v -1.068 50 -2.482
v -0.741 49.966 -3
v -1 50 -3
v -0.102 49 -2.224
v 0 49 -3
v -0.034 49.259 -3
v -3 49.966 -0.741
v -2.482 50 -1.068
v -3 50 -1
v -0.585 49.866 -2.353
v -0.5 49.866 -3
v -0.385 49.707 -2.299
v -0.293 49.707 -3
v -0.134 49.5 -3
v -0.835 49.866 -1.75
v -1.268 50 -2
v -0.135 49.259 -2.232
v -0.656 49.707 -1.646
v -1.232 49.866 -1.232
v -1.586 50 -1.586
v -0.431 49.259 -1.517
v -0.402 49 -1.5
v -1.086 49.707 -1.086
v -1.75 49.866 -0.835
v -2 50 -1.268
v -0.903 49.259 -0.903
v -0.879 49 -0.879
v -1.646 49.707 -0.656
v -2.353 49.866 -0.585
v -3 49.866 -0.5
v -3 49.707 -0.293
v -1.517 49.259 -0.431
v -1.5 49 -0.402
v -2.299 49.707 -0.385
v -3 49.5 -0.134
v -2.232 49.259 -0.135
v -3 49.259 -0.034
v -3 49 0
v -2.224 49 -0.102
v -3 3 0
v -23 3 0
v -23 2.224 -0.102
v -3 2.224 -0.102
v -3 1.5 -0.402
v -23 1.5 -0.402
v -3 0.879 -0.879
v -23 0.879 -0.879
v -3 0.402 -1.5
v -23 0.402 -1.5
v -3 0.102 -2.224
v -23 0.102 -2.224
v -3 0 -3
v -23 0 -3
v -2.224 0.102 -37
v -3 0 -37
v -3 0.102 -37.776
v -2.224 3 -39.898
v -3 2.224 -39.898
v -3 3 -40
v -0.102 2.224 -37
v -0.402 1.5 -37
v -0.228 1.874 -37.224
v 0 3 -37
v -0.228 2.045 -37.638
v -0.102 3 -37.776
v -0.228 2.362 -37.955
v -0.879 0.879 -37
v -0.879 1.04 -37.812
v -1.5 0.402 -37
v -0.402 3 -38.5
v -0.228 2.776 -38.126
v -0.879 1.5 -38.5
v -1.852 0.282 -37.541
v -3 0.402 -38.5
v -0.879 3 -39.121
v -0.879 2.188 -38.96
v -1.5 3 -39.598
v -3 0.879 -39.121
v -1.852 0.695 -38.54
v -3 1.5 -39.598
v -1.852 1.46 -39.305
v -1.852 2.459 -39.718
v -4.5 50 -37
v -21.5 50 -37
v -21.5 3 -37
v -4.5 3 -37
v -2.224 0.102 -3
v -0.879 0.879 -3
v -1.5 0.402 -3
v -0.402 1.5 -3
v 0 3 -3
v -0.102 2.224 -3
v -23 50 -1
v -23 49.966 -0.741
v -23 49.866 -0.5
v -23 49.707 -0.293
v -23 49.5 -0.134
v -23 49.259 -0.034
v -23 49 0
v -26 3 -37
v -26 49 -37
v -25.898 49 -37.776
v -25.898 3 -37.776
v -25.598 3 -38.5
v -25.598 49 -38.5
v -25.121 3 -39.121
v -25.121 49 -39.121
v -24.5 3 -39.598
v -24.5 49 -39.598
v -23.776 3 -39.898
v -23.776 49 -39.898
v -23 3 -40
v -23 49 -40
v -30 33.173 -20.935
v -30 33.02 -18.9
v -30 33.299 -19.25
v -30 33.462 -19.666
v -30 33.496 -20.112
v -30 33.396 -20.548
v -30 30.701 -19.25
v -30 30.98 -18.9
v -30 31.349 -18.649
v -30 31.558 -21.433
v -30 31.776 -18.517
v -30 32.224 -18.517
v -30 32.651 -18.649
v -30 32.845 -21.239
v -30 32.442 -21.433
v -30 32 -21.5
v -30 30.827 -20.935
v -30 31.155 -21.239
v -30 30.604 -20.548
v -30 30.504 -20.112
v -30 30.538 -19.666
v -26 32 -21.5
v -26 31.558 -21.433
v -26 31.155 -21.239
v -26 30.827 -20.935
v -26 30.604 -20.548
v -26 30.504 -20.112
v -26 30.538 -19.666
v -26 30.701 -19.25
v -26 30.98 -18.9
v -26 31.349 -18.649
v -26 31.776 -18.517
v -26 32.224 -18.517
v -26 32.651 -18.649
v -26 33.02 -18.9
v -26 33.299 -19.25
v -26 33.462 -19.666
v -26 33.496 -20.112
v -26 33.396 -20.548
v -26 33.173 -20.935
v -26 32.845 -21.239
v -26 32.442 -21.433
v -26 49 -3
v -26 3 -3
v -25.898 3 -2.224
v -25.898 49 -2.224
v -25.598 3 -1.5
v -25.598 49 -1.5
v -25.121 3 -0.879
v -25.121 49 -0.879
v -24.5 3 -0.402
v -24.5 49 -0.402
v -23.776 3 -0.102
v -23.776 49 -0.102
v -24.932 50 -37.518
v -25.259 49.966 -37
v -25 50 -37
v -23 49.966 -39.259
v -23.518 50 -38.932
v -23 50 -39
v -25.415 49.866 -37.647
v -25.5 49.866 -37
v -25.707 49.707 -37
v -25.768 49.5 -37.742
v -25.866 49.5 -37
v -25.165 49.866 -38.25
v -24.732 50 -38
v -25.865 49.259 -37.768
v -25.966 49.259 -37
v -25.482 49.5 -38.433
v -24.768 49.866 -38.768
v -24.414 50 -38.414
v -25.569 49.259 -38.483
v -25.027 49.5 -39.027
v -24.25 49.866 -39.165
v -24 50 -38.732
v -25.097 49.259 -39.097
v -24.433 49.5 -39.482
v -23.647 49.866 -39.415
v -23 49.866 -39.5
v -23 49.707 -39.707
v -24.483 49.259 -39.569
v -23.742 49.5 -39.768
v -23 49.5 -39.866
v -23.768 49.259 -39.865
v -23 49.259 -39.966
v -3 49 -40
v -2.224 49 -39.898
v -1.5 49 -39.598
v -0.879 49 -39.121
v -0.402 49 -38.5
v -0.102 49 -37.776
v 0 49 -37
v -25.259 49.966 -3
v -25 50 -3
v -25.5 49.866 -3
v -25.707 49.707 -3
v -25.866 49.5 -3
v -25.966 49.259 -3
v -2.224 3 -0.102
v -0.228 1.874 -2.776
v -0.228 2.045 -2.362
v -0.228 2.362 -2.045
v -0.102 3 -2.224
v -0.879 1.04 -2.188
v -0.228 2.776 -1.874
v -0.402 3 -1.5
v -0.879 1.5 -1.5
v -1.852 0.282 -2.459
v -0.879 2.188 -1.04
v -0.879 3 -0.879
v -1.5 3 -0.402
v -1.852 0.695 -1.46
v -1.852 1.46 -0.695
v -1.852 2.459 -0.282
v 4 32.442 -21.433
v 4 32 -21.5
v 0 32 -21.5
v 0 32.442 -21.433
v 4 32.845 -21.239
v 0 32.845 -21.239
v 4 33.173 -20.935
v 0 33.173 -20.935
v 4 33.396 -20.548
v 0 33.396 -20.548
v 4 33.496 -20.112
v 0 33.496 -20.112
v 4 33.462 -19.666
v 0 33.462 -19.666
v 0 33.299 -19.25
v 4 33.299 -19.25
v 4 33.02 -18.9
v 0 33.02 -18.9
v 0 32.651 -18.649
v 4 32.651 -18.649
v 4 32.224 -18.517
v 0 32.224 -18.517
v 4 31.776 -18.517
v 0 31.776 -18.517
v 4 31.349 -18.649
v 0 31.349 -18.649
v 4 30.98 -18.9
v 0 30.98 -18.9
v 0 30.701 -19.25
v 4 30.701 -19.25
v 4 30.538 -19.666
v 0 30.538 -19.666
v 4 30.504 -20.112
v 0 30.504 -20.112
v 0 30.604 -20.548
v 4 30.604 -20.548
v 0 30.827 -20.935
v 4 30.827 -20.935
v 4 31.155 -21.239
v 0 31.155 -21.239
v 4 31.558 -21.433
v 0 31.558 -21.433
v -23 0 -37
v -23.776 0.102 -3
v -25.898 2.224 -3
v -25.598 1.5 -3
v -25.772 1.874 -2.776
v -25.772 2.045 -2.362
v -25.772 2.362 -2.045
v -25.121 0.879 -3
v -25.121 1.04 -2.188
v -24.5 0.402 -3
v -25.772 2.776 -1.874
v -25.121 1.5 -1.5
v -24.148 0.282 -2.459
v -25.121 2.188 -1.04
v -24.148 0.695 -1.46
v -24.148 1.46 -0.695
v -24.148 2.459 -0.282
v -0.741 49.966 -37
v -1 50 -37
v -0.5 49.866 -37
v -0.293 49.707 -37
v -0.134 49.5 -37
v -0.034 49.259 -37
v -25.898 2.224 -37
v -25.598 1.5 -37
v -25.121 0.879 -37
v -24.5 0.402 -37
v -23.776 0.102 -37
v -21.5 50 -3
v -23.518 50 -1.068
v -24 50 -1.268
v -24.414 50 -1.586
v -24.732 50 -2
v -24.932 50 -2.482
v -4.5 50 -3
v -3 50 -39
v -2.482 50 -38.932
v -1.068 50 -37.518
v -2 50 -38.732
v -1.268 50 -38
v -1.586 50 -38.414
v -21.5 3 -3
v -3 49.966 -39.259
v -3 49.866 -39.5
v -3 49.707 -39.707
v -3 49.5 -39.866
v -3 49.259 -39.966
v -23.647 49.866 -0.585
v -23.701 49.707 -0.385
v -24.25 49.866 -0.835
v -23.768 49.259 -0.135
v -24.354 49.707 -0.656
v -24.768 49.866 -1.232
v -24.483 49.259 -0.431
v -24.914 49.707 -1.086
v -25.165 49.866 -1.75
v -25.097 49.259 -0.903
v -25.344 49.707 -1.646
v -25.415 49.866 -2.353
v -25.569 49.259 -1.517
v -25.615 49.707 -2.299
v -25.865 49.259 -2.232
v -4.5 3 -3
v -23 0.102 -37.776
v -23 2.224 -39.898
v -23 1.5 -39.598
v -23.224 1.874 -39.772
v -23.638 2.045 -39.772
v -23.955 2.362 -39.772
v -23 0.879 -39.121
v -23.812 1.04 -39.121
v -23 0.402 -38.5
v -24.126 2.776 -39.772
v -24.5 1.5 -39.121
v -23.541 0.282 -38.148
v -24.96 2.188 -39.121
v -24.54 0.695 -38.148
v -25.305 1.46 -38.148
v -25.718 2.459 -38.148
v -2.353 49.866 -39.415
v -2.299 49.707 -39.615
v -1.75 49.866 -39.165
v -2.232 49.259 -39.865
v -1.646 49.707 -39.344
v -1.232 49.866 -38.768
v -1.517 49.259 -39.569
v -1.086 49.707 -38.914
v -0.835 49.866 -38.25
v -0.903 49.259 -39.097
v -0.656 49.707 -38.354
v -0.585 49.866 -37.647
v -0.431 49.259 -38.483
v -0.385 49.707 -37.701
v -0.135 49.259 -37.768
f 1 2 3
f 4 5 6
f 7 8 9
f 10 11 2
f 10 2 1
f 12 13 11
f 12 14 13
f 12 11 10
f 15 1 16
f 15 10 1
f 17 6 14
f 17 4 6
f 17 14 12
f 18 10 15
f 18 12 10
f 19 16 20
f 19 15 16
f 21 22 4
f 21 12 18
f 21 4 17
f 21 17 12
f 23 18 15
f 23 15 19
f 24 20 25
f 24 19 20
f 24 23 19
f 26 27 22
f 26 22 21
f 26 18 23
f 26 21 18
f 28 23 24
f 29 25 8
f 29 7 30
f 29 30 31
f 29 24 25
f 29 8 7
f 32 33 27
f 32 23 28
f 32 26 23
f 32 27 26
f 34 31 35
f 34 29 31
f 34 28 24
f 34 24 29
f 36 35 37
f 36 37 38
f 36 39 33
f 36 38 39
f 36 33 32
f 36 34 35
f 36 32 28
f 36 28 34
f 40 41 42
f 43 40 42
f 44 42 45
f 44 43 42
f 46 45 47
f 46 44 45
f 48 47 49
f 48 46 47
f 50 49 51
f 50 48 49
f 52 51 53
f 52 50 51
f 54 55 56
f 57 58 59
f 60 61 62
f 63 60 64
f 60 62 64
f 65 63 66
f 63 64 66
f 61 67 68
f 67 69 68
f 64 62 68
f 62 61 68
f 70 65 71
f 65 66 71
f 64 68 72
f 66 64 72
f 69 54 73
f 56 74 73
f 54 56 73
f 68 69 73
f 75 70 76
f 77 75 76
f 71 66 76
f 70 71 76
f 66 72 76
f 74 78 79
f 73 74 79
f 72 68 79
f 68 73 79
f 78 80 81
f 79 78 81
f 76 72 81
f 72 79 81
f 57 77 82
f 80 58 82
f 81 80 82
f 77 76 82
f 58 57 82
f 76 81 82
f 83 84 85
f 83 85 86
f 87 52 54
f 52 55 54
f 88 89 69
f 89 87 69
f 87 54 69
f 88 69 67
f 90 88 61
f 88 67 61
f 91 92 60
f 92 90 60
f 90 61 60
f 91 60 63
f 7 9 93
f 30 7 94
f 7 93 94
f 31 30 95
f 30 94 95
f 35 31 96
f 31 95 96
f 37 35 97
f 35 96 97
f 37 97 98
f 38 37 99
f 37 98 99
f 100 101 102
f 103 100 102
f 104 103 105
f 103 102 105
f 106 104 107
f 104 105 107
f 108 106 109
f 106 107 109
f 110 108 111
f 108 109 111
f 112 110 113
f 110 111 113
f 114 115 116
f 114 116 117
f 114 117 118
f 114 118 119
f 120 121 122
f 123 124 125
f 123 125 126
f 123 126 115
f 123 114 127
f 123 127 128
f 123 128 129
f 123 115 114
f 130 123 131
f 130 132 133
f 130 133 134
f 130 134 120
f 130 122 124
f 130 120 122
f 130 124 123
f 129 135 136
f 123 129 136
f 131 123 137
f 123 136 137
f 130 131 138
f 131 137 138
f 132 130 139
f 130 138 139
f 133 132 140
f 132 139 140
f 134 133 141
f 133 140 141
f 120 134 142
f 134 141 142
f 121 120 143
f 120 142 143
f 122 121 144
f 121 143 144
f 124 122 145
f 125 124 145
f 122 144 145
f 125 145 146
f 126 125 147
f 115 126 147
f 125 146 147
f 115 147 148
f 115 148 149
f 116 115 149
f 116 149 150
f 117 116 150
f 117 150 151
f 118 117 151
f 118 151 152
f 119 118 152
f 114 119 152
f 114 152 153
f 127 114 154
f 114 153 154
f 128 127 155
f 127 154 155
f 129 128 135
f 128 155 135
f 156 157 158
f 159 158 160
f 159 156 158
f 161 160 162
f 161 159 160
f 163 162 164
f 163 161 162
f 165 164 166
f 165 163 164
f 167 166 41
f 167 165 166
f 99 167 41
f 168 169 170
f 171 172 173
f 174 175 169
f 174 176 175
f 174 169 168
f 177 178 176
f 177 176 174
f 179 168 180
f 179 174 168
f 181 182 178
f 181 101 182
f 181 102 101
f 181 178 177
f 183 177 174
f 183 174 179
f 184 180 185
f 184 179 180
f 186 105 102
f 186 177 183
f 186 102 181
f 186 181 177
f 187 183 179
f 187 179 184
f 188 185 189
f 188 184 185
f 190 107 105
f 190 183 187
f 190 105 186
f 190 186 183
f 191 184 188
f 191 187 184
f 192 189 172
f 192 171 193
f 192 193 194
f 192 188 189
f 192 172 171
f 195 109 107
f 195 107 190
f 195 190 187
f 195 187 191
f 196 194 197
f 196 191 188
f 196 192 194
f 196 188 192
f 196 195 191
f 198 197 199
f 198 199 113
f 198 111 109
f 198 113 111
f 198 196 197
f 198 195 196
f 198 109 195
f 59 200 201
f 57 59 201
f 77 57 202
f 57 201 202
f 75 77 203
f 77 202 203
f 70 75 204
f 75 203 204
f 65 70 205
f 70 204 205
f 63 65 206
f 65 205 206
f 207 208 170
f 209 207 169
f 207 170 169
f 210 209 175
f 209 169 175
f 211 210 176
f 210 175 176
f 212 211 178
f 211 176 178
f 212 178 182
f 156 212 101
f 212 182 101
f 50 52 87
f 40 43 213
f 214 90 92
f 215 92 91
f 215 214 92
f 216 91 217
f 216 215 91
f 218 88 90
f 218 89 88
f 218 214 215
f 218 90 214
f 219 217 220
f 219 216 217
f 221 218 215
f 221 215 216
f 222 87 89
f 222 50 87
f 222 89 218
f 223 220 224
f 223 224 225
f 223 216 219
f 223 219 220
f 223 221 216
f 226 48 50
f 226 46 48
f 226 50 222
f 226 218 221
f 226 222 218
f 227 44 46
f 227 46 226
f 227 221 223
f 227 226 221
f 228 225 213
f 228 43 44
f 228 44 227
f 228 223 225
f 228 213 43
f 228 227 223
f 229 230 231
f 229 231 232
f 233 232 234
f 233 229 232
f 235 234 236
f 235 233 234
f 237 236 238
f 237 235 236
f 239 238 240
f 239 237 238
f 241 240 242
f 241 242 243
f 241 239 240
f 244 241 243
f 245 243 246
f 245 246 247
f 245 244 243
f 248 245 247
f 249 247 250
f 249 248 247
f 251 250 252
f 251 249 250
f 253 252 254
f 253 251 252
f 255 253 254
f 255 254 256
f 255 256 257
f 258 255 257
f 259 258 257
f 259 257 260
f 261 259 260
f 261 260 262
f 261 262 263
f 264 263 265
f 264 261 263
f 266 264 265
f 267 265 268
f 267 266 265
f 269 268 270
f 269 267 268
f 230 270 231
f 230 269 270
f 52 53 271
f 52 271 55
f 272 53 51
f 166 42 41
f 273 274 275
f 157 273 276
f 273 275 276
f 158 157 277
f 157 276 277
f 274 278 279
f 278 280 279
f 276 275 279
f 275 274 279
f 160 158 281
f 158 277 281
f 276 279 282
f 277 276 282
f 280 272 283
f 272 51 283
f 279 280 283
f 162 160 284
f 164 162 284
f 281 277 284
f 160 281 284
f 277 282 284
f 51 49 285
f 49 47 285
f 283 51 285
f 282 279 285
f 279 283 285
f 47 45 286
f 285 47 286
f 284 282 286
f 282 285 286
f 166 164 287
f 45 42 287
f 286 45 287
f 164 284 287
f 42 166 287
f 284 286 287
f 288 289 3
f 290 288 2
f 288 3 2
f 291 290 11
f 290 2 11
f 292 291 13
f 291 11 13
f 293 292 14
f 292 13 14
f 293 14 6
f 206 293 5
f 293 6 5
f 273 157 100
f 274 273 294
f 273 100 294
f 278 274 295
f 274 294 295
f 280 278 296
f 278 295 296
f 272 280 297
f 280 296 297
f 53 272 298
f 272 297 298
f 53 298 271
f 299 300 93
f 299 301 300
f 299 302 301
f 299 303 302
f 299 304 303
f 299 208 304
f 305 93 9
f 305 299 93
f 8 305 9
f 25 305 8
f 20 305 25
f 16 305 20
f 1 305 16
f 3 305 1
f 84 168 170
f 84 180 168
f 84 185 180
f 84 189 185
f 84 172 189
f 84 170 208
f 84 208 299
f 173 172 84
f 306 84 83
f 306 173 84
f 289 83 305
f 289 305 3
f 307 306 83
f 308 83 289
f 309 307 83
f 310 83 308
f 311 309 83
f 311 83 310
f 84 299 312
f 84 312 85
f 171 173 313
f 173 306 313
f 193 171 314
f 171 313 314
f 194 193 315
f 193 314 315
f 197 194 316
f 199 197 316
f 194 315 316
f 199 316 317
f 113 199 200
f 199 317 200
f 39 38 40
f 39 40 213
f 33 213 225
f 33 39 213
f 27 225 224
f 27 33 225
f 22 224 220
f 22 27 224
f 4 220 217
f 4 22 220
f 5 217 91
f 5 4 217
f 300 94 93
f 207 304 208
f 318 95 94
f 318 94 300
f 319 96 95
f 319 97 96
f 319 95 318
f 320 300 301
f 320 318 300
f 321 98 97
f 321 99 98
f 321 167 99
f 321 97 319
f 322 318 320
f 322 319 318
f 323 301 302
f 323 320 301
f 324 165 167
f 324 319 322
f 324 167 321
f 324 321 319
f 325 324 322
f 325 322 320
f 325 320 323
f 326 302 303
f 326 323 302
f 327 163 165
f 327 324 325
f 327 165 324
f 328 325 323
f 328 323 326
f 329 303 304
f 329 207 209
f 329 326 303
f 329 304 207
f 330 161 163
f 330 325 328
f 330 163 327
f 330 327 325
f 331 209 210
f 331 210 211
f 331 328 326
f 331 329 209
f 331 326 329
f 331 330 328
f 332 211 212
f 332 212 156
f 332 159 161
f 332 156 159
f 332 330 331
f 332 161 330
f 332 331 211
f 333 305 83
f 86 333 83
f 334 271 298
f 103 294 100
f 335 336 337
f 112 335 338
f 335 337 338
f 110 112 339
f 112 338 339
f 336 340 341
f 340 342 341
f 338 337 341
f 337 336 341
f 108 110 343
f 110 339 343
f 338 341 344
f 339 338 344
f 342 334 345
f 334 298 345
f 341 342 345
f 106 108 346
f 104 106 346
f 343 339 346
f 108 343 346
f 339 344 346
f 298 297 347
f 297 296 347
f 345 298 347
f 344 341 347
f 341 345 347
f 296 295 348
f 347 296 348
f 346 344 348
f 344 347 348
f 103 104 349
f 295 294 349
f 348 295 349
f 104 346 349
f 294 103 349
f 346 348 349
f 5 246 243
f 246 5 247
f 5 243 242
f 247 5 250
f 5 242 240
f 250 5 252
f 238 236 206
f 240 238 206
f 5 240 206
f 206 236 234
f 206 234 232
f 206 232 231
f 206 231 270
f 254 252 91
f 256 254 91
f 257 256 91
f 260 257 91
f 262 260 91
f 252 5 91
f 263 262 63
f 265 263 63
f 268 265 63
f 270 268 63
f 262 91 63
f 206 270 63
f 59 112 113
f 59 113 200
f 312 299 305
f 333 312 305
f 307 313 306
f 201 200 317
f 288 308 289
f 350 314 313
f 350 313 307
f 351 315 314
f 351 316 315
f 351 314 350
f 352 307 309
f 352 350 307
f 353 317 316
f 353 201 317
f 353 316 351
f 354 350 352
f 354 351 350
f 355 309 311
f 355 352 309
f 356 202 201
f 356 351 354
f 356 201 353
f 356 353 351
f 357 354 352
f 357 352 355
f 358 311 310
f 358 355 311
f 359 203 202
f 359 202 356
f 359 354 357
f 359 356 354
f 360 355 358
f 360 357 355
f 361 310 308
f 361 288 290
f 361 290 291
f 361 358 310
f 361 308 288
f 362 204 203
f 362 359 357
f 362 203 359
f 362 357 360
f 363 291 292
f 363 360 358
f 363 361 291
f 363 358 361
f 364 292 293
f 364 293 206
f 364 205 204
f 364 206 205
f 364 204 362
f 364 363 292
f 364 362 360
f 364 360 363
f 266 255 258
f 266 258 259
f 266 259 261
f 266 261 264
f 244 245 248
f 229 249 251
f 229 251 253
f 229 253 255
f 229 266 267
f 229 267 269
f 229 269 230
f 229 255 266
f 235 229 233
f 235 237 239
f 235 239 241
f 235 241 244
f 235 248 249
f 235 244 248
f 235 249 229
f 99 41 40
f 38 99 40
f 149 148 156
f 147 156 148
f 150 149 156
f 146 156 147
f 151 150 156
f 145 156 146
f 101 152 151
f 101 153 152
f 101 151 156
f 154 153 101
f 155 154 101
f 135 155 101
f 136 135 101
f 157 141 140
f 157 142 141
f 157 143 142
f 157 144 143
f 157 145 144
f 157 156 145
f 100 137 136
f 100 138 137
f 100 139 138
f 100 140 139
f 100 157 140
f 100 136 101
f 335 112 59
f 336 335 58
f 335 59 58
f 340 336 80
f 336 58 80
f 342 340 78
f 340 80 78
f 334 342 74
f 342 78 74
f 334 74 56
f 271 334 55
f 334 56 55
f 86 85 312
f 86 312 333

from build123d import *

# Parameters (mm, degrees)
CROQUIS1_W              = 26
CROQUIS1_H              = 40
SALIENTE_EXTRUIR1_DEPTH = 50
CROQUIS2_W              = 17
CROQUIS2_H              = 34
CORTAR_EXTRUIR1_DEPTH   = 47
REDONDEO1_R             = 3
REDONDEO2_R             = 1
CROQUIS4_R              = 1.5
SALIENTE_EXTRUIR2_DEPTH = 4
SALIENTE_EXTRUIR3_START = 4
CROQUIS5_R              = 1.5
SALIENTE_EXTRUIR3_DEPTH = 4


with BuildPart() as part:
    # Croquis1 → Saliente-Extruir1 (new body)
    with BuildSketch(Plane(origin=(0, 0, 0), x_dir=(1, 0, 0), z_dir=(0, 1, 0))):
        with Locations((-13, 20)):
            Rectangle(CROQUIS1_W, CROQUIS1_H)
    extrude(amount=SALIENTE_EXTRUIR1_DEPTH)

    # Croquis2 → Cortar-Extruir1 (cut)
    with BuildSketch(Plane(origin=(0, 50, 0), x_dir=(1, 0, 0), z_dir=(0, 1, 0))):
        with Locations((-13, 20)):
            Rectangle(CROQUIS2_W, CROQUIS2_H)
    extrude(amount=-CORTAR_EXTRUIR1_DEPTH, mode=Mode.SUBTRACT)

    # Redondeo1
    redondeo1_edges = [part.edges().sort_by_distance(p)[0] for p in [
        (-13, 0, 0),
        (-26, 0, -20),
        (-13, 0, -40),
        (0, 0, -20),
        (0, 25, 0),
        (-26, 25, 0),
        (-26, 25, -40),
        (0, 25, -40),
    ]]
    fillet(redondeo1_edges, radius=REDONDEO1_R)

    # Redondeo2
    redondeo2_edges = [part.edges().sort_by_distance(p)[0] for p in [
        (-13, 50, -40),
        (-26, 50, -20),
        (-13, 50, 0),
        (0, 50, -20),
        (-25.121320344, 50, -0.878679656),
        (-0.878679656, 50, -0.878679656),
        (-0.878679656, 50, -39.121320344),
        (-25.121320344, 50, -39.121320344),
    ]]
    fillet(redondeo2_edges, radius=REDONDEO2_R)

    # Croquis4 → Saliente-Extruir2 (add)
    with BuildSketch(Plane.ZY.offset(26)):
        with Locations(Location((-20, 32, 0), (0, 0, 180))):
            Circle(CROQUIS4_R)
    extrude(amount=SALIENTE_EXTRUIR2_DEPTH)

    # Croquis5 → Saliente-Extruir3 (add)
    with BuildSketch(Plane(origin=(0, 0, 0), x_dir=(0, 0, -1), z_dir=(1, 0, 0)).offset(SALIENTE_EXTRUIR3_START)):
        with Locations((20, 32)):
            Circle(CROQUIS5_R)
    extrude(amount=-SALIENTE_EXTRUIR3_DEPTH)


solid = part.part
